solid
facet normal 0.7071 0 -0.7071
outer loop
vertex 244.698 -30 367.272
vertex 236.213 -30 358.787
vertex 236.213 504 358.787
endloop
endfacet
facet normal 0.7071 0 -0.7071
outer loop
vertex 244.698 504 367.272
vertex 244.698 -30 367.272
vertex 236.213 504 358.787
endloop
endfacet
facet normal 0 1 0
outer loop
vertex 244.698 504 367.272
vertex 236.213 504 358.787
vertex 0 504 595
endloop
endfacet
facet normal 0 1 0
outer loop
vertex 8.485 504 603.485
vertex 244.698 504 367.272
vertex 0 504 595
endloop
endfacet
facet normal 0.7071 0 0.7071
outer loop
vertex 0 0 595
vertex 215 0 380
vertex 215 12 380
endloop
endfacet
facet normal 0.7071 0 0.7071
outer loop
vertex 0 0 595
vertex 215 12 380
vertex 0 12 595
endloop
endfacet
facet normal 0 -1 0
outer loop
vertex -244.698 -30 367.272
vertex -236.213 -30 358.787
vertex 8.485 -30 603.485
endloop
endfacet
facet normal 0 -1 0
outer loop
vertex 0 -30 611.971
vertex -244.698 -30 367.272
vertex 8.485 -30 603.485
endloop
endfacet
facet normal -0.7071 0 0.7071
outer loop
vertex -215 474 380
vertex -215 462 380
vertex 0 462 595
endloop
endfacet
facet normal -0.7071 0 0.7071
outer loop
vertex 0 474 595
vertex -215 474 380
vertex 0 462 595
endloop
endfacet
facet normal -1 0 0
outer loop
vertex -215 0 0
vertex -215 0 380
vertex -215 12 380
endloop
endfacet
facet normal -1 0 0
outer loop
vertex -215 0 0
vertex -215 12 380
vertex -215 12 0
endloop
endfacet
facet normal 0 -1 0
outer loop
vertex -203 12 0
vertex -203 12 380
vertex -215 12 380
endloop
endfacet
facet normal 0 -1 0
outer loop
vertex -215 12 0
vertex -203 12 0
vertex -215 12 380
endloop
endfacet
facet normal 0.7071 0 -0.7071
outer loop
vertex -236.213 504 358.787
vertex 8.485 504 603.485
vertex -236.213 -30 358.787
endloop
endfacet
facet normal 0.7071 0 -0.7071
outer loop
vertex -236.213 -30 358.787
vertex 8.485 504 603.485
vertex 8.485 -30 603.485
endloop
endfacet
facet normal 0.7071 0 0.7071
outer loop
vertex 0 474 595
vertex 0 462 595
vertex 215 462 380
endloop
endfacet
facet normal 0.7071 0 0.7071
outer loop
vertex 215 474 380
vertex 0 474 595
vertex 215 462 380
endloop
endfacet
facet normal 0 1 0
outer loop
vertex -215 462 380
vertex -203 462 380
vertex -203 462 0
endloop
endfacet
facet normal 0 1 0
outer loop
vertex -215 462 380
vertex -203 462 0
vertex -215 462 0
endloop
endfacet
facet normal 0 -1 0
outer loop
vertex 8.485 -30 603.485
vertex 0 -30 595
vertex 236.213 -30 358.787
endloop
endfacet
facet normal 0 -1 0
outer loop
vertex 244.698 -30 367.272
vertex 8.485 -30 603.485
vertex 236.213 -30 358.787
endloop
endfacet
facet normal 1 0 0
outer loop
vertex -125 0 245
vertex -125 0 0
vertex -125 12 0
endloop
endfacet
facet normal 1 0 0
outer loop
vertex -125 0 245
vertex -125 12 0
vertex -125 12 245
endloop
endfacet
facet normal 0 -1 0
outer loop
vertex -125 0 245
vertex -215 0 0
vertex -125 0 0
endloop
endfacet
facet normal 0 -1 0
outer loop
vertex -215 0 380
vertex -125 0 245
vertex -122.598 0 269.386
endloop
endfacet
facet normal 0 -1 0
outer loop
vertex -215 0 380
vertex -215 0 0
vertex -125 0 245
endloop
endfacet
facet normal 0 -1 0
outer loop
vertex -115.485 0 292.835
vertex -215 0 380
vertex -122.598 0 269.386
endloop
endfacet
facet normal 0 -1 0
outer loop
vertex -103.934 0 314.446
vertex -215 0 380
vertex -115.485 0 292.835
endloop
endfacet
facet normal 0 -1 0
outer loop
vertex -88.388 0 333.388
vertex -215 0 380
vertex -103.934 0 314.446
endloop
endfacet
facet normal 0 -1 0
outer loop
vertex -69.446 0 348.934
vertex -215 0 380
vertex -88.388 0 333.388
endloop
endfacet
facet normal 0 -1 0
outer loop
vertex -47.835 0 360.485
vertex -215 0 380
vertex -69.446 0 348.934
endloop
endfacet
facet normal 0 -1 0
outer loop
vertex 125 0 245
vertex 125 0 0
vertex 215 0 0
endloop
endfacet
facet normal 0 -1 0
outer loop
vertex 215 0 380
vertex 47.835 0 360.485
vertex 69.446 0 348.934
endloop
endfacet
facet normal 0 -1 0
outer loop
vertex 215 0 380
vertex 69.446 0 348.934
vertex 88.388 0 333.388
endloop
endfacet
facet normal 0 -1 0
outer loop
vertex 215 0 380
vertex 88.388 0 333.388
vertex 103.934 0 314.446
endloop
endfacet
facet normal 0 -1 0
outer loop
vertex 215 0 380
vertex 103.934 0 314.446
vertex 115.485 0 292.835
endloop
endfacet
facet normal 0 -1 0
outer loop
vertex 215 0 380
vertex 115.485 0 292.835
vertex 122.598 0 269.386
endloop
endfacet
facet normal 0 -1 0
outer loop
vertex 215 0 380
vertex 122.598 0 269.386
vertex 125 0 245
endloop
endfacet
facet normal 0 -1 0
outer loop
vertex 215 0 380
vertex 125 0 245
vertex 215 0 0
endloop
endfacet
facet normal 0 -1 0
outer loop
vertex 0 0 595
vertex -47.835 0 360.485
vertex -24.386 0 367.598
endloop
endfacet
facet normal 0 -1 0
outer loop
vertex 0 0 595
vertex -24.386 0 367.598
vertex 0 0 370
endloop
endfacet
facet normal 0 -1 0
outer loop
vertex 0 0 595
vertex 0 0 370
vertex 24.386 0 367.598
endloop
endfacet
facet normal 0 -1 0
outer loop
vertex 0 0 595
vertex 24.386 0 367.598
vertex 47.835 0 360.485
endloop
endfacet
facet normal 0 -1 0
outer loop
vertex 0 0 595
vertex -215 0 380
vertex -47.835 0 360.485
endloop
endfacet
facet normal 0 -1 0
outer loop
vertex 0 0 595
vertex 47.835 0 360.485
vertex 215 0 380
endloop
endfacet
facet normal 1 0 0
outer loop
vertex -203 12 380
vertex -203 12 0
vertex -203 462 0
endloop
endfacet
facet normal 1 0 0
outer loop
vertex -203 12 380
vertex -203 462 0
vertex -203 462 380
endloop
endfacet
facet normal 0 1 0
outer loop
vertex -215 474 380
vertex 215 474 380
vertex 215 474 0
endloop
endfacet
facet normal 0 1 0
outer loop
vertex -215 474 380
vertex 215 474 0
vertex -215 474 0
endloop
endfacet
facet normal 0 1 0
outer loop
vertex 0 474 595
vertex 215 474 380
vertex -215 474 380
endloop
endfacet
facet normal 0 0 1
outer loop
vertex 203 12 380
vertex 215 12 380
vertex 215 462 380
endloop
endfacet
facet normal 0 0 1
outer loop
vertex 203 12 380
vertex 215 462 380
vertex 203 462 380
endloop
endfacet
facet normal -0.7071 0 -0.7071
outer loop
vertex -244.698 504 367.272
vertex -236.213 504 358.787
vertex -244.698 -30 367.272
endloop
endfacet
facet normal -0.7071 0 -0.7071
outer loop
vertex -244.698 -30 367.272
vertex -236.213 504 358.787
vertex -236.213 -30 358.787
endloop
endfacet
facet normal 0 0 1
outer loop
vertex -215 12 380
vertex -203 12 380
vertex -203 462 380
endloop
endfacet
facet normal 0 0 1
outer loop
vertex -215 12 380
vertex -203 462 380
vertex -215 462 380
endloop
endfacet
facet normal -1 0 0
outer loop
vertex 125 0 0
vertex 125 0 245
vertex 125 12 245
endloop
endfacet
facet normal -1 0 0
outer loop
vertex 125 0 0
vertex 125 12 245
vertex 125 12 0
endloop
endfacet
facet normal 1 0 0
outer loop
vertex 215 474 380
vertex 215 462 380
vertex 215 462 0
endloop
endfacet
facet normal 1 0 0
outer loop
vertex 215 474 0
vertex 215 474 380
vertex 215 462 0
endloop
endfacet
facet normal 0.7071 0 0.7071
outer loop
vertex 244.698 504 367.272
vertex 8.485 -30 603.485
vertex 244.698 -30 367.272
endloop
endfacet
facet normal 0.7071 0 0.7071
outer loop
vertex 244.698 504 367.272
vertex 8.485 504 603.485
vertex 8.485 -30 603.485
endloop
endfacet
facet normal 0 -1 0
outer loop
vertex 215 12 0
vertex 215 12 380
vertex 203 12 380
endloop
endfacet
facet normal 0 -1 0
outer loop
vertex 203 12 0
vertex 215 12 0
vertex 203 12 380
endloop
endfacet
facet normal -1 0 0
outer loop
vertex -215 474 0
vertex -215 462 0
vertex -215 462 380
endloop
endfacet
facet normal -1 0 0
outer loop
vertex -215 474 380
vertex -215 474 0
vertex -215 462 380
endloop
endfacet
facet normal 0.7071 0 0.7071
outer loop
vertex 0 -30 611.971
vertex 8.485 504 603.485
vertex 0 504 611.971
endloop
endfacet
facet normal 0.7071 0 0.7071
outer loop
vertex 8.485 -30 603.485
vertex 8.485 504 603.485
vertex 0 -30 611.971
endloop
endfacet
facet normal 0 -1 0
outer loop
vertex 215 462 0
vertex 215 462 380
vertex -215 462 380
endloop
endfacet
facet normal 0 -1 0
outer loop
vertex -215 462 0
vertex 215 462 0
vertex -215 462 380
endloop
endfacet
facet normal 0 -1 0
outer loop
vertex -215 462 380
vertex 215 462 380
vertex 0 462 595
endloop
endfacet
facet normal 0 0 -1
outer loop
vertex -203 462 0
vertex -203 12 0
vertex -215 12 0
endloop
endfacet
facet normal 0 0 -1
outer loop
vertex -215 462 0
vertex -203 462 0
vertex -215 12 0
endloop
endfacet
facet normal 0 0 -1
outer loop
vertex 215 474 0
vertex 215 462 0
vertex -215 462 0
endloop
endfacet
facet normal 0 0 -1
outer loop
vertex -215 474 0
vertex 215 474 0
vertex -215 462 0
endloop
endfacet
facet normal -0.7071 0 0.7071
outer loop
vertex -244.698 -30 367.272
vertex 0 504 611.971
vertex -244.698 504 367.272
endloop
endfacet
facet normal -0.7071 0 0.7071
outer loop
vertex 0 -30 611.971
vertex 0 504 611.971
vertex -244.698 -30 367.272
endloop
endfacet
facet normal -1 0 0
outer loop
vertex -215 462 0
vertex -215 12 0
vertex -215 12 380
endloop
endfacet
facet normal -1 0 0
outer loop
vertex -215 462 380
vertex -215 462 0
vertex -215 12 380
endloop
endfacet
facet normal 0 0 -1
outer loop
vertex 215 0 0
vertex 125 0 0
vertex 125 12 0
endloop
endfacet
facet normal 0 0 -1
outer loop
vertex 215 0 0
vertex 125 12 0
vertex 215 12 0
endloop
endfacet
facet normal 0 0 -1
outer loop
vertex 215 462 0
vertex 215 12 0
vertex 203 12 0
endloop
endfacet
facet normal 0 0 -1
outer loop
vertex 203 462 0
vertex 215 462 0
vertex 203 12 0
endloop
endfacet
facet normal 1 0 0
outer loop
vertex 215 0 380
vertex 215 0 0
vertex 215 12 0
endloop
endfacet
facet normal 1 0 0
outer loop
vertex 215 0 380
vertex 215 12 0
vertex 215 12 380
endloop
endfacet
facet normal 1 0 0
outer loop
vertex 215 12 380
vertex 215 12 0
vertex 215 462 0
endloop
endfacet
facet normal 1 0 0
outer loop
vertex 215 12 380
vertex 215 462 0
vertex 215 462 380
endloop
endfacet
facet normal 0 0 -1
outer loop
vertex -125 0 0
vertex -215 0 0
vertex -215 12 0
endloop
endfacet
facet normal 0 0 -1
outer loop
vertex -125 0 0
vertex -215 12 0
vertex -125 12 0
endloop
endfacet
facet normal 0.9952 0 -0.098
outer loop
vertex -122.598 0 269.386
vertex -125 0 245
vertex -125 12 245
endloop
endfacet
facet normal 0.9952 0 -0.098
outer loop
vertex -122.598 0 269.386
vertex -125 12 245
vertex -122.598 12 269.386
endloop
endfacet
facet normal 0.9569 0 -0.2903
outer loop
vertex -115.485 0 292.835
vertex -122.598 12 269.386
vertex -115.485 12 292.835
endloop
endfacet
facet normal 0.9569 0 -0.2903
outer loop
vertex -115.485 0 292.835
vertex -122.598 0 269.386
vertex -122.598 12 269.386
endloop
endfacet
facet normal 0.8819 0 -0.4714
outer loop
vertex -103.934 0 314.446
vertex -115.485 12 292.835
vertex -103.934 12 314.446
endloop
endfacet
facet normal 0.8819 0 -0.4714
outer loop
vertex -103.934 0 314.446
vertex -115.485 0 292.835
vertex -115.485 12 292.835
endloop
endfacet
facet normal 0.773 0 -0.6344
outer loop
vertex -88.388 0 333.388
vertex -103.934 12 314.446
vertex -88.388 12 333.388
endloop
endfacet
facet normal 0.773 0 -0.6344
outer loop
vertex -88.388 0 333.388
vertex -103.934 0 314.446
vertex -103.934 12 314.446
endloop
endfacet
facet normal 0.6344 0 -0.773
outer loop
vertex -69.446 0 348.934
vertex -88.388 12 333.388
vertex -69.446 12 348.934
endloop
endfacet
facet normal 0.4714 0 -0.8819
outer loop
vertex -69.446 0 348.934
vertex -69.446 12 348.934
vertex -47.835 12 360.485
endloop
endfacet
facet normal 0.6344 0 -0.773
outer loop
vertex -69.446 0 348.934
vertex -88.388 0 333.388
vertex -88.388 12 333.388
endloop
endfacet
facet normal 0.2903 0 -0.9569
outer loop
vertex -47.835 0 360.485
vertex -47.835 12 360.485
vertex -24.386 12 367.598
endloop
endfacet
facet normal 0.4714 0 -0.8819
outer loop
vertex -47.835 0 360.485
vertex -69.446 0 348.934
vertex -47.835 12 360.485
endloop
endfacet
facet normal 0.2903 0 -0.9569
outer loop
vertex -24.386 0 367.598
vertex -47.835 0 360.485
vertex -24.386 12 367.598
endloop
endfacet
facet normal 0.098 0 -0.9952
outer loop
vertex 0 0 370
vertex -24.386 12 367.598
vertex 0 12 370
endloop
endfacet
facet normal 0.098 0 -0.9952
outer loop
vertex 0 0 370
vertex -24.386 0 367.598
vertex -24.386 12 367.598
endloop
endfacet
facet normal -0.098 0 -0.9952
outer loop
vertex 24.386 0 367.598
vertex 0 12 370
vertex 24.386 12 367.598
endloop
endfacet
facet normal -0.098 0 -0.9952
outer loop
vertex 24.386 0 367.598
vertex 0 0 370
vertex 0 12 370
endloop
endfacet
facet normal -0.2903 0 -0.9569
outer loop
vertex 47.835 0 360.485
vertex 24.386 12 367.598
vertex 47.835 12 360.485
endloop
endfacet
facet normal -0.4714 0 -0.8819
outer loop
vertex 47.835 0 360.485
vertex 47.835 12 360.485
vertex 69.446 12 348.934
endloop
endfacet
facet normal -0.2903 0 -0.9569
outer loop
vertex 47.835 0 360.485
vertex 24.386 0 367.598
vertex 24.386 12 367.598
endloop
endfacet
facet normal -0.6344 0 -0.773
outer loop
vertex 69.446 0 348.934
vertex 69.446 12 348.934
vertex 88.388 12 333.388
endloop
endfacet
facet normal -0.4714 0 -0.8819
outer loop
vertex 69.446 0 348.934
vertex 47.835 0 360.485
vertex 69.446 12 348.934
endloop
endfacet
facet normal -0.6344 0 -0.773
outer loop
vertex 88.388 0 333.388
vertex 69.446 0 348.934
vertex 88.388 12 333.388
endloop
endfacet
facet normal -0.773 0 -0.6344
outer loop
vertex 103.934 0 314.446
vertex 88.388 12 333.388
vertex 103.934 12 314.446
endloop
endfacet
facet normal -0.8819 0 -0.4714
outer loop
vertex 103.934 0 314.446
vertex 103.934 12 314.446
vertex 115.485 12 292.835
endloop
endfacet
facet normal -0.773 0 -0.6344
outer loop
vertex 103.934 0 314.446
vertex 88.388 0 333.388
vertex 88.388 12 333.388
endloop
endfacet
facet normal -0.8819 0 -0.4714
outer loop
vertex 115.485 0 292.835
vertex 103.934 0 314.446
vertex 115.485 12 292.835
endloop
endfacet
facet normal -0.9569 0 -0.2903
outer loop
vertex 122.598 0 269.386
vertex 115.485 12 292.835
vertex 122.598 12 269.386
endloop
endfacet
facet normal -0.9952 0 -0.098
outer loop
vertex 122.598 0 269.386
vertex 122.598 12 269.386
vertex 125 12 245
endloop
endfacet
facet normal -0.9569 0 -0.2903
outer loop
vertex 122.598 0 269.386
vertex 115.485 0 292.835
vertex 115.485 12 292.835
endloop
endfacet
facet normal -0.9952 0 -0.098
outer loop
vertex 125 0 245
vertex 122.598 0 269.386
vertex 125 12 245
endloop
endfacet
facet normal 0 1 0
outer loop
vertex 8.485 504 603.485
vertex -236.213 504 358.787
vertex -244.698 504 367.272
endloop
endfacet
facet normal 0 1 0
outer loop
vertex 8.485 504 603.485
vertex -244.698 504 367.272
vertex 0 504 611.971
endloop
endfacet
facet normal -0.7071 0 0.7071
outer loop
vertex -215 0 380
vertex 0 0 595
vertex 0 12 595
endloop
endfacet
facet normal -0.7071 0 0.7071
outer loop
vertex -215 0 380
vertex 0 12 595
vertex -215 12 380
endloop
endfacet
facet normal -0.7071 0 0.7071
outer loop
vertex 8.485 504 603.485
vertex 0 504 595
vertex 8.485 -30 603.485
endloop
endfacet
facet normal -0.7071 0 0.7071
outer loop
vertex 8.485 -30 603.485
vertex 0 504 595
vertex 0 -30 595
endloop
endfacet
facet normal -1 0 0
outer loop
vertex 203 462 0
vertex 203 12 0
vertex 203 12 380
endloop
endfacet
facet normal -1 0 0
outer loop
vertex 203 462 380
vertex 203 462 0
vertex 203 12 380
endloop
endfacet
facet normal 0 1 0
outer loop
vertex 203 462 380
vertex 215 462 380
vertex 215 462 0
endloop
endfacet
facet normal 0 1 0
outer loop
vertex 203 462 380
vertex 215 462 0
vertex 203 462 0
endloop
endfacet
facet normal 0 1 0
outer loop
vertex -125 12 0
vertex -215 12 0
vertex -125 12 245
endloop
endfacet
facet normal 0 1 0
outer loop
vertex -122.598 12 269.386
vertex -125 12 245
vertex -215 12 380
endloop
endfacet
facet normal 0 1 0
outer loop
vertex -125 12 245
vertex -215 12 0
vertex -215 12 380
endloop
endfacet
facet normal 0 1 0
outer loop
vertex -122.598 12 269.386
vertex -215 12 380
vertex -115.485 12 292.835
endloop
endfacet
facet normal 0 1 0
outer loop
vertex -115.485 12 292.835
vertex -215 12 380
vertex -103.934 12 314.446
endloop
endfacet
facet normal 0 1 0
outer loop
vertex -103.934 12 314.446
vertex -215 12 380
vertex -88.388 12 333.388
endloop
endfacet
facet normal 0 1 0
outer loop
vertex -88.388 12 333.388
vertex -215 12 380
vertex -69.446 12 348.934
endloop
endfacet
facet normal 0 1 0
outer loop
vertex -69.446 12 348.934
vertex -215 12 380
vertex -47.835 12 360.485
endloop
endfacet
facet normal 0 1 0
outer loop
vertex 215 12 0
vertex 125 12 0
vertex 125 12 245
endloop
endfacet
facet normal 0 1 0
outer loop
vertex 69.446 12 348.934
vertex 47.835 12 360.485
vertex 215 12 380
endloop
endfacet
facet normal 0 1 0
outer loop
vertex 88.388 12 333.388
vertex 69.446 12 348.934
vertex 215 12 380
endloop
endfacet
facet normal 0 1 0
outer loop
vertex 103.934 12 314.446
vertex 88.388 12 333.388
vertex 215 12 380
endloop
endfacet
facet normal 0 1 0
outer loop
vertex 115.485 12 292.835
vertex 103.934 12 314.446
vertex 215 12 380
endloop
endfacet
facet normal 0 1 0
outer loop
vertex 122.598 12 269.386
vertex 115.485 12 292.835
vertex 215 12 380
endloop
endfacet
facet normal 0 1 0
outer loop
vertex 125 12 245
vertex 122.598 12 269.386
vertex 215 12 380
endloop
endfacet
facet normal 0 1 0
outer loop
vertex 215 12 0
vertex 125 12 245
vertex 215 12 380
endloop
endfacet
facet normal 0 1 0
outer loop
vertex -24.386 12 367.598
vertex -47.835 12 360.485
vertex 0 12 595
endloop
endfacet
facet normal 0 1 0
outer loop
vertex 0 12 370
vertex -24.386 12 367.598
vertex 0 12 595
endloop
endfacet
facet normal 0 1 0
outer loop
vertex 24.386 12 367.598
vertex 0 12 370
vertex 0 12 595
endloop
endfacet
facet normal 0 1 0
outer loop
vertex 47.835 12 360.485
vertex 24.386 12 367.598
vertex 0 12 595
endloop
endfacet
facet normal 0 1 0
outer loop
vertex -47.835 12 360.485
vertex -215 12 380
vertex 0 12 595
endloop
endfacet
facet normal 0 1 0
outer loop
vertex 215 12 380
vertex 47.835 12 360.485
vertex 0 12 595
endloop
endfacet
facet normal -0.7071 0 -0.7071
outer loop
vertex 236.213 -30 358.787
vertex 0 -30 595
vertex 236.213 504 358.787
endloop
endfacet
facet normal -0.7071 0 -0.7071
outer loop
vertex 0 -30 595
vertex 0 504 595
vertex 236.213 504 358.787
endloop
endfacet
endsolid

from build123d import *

# Parameters (mm, degrees)
F1_DEPTH = 12
F2_W     = 12
F2_H     = 380
F3_DEPTH = 450
F5_DEPTH = 12
F6_W     = 304.055916
F6_H     = 12
F7_DEPTH = 12
F8_W     = 534
F8_H     = 346.055916
F9_DEPTH = 12


with BuildPart() as f1:
    # F0 (on Front) → F1 (new body)
    with BuildSketch(Plane.XZ):
        with BuildLine():
            Line((-215, 380), (-215, 0))
            Line((-215, 0), (-125, 0))
            Line((-125, 0), (-125, 245))
            ThreePointArc((-125, 245), (0, 370), (125, 245))
            Line((125, 245), (125, 0))
            Line((125, 0), (215, 0))
            Line((215, 0), (215, 380))
            Line((215, 380), (0, 595))
            Line((0, 595), (-215, 380))
        make_face()
    extrude(amount=-F1_DEPTH)


with BuildPart() as f3:
    # F2 (on face) → F3 (new body)
    with BuildSketch(Plane(origin=(0, 12, 0), x_dir=(-1, 0, 0), z_dir=(0, 1, 0))):
        with Locations((-209, 190)):
            Rectangle(F2_W, F2_H)
        with Locations((209, 190)):
            Rectangle(F2_W, F2_H)
    extrude(amount=F3_DEPTH)


with BuildPart() as f5:
    # F4 (on face) → F5 (new body)
    with BuildSketch(Plane(origin=(0, 462, 0), x_dir=(-1, 0, 0), z_dir=(0, 1, 0))):
        Polygon((-215, 380), (-215, 0), (60.764808, 0), (215, 0), (215, 380), (0, 595), align=None)
    extrude(amount=F5_DEPTH)


with BuildPart() as f7:
    # F6 (on face) → F7 (new body)
    with BuildSketch(Plane(origin=(297.5, 0, 297.5), x_dir=(0.707107, 0, -0.707107), z_dir=(0.707107, 0, 0.707107))):
        with Locations((-268.700577, 6)):
            Rectangle(F6_W, F6_H)
        Polygon((-420.728535, 0), (-420.728535, -30), (-86.672619, -30), (-86.672619, 504), (-420.728535, 504), (-420.728535, 12), (-116.672619, 12), (-116.672619, 0), align=None)
    extrude(amount=F7_DEPTH)


with BuildPart() as f9:
    # F8 (on face) → F9 (new body)
    with BuildSketch(Plane(origin=(-297.5, 0, 297.5), x_dir=(0, -1, 0), z_dir=(-0.707107, 0, 0.707107))):
        with Locations((-237, 259.700577)):
            Rectangle(F8_W, F8_H)
    extrude(amount=F9_DEPTH)


solid = Compound([f1.part, f3.part, f5.part, f7.part, f9.part])
